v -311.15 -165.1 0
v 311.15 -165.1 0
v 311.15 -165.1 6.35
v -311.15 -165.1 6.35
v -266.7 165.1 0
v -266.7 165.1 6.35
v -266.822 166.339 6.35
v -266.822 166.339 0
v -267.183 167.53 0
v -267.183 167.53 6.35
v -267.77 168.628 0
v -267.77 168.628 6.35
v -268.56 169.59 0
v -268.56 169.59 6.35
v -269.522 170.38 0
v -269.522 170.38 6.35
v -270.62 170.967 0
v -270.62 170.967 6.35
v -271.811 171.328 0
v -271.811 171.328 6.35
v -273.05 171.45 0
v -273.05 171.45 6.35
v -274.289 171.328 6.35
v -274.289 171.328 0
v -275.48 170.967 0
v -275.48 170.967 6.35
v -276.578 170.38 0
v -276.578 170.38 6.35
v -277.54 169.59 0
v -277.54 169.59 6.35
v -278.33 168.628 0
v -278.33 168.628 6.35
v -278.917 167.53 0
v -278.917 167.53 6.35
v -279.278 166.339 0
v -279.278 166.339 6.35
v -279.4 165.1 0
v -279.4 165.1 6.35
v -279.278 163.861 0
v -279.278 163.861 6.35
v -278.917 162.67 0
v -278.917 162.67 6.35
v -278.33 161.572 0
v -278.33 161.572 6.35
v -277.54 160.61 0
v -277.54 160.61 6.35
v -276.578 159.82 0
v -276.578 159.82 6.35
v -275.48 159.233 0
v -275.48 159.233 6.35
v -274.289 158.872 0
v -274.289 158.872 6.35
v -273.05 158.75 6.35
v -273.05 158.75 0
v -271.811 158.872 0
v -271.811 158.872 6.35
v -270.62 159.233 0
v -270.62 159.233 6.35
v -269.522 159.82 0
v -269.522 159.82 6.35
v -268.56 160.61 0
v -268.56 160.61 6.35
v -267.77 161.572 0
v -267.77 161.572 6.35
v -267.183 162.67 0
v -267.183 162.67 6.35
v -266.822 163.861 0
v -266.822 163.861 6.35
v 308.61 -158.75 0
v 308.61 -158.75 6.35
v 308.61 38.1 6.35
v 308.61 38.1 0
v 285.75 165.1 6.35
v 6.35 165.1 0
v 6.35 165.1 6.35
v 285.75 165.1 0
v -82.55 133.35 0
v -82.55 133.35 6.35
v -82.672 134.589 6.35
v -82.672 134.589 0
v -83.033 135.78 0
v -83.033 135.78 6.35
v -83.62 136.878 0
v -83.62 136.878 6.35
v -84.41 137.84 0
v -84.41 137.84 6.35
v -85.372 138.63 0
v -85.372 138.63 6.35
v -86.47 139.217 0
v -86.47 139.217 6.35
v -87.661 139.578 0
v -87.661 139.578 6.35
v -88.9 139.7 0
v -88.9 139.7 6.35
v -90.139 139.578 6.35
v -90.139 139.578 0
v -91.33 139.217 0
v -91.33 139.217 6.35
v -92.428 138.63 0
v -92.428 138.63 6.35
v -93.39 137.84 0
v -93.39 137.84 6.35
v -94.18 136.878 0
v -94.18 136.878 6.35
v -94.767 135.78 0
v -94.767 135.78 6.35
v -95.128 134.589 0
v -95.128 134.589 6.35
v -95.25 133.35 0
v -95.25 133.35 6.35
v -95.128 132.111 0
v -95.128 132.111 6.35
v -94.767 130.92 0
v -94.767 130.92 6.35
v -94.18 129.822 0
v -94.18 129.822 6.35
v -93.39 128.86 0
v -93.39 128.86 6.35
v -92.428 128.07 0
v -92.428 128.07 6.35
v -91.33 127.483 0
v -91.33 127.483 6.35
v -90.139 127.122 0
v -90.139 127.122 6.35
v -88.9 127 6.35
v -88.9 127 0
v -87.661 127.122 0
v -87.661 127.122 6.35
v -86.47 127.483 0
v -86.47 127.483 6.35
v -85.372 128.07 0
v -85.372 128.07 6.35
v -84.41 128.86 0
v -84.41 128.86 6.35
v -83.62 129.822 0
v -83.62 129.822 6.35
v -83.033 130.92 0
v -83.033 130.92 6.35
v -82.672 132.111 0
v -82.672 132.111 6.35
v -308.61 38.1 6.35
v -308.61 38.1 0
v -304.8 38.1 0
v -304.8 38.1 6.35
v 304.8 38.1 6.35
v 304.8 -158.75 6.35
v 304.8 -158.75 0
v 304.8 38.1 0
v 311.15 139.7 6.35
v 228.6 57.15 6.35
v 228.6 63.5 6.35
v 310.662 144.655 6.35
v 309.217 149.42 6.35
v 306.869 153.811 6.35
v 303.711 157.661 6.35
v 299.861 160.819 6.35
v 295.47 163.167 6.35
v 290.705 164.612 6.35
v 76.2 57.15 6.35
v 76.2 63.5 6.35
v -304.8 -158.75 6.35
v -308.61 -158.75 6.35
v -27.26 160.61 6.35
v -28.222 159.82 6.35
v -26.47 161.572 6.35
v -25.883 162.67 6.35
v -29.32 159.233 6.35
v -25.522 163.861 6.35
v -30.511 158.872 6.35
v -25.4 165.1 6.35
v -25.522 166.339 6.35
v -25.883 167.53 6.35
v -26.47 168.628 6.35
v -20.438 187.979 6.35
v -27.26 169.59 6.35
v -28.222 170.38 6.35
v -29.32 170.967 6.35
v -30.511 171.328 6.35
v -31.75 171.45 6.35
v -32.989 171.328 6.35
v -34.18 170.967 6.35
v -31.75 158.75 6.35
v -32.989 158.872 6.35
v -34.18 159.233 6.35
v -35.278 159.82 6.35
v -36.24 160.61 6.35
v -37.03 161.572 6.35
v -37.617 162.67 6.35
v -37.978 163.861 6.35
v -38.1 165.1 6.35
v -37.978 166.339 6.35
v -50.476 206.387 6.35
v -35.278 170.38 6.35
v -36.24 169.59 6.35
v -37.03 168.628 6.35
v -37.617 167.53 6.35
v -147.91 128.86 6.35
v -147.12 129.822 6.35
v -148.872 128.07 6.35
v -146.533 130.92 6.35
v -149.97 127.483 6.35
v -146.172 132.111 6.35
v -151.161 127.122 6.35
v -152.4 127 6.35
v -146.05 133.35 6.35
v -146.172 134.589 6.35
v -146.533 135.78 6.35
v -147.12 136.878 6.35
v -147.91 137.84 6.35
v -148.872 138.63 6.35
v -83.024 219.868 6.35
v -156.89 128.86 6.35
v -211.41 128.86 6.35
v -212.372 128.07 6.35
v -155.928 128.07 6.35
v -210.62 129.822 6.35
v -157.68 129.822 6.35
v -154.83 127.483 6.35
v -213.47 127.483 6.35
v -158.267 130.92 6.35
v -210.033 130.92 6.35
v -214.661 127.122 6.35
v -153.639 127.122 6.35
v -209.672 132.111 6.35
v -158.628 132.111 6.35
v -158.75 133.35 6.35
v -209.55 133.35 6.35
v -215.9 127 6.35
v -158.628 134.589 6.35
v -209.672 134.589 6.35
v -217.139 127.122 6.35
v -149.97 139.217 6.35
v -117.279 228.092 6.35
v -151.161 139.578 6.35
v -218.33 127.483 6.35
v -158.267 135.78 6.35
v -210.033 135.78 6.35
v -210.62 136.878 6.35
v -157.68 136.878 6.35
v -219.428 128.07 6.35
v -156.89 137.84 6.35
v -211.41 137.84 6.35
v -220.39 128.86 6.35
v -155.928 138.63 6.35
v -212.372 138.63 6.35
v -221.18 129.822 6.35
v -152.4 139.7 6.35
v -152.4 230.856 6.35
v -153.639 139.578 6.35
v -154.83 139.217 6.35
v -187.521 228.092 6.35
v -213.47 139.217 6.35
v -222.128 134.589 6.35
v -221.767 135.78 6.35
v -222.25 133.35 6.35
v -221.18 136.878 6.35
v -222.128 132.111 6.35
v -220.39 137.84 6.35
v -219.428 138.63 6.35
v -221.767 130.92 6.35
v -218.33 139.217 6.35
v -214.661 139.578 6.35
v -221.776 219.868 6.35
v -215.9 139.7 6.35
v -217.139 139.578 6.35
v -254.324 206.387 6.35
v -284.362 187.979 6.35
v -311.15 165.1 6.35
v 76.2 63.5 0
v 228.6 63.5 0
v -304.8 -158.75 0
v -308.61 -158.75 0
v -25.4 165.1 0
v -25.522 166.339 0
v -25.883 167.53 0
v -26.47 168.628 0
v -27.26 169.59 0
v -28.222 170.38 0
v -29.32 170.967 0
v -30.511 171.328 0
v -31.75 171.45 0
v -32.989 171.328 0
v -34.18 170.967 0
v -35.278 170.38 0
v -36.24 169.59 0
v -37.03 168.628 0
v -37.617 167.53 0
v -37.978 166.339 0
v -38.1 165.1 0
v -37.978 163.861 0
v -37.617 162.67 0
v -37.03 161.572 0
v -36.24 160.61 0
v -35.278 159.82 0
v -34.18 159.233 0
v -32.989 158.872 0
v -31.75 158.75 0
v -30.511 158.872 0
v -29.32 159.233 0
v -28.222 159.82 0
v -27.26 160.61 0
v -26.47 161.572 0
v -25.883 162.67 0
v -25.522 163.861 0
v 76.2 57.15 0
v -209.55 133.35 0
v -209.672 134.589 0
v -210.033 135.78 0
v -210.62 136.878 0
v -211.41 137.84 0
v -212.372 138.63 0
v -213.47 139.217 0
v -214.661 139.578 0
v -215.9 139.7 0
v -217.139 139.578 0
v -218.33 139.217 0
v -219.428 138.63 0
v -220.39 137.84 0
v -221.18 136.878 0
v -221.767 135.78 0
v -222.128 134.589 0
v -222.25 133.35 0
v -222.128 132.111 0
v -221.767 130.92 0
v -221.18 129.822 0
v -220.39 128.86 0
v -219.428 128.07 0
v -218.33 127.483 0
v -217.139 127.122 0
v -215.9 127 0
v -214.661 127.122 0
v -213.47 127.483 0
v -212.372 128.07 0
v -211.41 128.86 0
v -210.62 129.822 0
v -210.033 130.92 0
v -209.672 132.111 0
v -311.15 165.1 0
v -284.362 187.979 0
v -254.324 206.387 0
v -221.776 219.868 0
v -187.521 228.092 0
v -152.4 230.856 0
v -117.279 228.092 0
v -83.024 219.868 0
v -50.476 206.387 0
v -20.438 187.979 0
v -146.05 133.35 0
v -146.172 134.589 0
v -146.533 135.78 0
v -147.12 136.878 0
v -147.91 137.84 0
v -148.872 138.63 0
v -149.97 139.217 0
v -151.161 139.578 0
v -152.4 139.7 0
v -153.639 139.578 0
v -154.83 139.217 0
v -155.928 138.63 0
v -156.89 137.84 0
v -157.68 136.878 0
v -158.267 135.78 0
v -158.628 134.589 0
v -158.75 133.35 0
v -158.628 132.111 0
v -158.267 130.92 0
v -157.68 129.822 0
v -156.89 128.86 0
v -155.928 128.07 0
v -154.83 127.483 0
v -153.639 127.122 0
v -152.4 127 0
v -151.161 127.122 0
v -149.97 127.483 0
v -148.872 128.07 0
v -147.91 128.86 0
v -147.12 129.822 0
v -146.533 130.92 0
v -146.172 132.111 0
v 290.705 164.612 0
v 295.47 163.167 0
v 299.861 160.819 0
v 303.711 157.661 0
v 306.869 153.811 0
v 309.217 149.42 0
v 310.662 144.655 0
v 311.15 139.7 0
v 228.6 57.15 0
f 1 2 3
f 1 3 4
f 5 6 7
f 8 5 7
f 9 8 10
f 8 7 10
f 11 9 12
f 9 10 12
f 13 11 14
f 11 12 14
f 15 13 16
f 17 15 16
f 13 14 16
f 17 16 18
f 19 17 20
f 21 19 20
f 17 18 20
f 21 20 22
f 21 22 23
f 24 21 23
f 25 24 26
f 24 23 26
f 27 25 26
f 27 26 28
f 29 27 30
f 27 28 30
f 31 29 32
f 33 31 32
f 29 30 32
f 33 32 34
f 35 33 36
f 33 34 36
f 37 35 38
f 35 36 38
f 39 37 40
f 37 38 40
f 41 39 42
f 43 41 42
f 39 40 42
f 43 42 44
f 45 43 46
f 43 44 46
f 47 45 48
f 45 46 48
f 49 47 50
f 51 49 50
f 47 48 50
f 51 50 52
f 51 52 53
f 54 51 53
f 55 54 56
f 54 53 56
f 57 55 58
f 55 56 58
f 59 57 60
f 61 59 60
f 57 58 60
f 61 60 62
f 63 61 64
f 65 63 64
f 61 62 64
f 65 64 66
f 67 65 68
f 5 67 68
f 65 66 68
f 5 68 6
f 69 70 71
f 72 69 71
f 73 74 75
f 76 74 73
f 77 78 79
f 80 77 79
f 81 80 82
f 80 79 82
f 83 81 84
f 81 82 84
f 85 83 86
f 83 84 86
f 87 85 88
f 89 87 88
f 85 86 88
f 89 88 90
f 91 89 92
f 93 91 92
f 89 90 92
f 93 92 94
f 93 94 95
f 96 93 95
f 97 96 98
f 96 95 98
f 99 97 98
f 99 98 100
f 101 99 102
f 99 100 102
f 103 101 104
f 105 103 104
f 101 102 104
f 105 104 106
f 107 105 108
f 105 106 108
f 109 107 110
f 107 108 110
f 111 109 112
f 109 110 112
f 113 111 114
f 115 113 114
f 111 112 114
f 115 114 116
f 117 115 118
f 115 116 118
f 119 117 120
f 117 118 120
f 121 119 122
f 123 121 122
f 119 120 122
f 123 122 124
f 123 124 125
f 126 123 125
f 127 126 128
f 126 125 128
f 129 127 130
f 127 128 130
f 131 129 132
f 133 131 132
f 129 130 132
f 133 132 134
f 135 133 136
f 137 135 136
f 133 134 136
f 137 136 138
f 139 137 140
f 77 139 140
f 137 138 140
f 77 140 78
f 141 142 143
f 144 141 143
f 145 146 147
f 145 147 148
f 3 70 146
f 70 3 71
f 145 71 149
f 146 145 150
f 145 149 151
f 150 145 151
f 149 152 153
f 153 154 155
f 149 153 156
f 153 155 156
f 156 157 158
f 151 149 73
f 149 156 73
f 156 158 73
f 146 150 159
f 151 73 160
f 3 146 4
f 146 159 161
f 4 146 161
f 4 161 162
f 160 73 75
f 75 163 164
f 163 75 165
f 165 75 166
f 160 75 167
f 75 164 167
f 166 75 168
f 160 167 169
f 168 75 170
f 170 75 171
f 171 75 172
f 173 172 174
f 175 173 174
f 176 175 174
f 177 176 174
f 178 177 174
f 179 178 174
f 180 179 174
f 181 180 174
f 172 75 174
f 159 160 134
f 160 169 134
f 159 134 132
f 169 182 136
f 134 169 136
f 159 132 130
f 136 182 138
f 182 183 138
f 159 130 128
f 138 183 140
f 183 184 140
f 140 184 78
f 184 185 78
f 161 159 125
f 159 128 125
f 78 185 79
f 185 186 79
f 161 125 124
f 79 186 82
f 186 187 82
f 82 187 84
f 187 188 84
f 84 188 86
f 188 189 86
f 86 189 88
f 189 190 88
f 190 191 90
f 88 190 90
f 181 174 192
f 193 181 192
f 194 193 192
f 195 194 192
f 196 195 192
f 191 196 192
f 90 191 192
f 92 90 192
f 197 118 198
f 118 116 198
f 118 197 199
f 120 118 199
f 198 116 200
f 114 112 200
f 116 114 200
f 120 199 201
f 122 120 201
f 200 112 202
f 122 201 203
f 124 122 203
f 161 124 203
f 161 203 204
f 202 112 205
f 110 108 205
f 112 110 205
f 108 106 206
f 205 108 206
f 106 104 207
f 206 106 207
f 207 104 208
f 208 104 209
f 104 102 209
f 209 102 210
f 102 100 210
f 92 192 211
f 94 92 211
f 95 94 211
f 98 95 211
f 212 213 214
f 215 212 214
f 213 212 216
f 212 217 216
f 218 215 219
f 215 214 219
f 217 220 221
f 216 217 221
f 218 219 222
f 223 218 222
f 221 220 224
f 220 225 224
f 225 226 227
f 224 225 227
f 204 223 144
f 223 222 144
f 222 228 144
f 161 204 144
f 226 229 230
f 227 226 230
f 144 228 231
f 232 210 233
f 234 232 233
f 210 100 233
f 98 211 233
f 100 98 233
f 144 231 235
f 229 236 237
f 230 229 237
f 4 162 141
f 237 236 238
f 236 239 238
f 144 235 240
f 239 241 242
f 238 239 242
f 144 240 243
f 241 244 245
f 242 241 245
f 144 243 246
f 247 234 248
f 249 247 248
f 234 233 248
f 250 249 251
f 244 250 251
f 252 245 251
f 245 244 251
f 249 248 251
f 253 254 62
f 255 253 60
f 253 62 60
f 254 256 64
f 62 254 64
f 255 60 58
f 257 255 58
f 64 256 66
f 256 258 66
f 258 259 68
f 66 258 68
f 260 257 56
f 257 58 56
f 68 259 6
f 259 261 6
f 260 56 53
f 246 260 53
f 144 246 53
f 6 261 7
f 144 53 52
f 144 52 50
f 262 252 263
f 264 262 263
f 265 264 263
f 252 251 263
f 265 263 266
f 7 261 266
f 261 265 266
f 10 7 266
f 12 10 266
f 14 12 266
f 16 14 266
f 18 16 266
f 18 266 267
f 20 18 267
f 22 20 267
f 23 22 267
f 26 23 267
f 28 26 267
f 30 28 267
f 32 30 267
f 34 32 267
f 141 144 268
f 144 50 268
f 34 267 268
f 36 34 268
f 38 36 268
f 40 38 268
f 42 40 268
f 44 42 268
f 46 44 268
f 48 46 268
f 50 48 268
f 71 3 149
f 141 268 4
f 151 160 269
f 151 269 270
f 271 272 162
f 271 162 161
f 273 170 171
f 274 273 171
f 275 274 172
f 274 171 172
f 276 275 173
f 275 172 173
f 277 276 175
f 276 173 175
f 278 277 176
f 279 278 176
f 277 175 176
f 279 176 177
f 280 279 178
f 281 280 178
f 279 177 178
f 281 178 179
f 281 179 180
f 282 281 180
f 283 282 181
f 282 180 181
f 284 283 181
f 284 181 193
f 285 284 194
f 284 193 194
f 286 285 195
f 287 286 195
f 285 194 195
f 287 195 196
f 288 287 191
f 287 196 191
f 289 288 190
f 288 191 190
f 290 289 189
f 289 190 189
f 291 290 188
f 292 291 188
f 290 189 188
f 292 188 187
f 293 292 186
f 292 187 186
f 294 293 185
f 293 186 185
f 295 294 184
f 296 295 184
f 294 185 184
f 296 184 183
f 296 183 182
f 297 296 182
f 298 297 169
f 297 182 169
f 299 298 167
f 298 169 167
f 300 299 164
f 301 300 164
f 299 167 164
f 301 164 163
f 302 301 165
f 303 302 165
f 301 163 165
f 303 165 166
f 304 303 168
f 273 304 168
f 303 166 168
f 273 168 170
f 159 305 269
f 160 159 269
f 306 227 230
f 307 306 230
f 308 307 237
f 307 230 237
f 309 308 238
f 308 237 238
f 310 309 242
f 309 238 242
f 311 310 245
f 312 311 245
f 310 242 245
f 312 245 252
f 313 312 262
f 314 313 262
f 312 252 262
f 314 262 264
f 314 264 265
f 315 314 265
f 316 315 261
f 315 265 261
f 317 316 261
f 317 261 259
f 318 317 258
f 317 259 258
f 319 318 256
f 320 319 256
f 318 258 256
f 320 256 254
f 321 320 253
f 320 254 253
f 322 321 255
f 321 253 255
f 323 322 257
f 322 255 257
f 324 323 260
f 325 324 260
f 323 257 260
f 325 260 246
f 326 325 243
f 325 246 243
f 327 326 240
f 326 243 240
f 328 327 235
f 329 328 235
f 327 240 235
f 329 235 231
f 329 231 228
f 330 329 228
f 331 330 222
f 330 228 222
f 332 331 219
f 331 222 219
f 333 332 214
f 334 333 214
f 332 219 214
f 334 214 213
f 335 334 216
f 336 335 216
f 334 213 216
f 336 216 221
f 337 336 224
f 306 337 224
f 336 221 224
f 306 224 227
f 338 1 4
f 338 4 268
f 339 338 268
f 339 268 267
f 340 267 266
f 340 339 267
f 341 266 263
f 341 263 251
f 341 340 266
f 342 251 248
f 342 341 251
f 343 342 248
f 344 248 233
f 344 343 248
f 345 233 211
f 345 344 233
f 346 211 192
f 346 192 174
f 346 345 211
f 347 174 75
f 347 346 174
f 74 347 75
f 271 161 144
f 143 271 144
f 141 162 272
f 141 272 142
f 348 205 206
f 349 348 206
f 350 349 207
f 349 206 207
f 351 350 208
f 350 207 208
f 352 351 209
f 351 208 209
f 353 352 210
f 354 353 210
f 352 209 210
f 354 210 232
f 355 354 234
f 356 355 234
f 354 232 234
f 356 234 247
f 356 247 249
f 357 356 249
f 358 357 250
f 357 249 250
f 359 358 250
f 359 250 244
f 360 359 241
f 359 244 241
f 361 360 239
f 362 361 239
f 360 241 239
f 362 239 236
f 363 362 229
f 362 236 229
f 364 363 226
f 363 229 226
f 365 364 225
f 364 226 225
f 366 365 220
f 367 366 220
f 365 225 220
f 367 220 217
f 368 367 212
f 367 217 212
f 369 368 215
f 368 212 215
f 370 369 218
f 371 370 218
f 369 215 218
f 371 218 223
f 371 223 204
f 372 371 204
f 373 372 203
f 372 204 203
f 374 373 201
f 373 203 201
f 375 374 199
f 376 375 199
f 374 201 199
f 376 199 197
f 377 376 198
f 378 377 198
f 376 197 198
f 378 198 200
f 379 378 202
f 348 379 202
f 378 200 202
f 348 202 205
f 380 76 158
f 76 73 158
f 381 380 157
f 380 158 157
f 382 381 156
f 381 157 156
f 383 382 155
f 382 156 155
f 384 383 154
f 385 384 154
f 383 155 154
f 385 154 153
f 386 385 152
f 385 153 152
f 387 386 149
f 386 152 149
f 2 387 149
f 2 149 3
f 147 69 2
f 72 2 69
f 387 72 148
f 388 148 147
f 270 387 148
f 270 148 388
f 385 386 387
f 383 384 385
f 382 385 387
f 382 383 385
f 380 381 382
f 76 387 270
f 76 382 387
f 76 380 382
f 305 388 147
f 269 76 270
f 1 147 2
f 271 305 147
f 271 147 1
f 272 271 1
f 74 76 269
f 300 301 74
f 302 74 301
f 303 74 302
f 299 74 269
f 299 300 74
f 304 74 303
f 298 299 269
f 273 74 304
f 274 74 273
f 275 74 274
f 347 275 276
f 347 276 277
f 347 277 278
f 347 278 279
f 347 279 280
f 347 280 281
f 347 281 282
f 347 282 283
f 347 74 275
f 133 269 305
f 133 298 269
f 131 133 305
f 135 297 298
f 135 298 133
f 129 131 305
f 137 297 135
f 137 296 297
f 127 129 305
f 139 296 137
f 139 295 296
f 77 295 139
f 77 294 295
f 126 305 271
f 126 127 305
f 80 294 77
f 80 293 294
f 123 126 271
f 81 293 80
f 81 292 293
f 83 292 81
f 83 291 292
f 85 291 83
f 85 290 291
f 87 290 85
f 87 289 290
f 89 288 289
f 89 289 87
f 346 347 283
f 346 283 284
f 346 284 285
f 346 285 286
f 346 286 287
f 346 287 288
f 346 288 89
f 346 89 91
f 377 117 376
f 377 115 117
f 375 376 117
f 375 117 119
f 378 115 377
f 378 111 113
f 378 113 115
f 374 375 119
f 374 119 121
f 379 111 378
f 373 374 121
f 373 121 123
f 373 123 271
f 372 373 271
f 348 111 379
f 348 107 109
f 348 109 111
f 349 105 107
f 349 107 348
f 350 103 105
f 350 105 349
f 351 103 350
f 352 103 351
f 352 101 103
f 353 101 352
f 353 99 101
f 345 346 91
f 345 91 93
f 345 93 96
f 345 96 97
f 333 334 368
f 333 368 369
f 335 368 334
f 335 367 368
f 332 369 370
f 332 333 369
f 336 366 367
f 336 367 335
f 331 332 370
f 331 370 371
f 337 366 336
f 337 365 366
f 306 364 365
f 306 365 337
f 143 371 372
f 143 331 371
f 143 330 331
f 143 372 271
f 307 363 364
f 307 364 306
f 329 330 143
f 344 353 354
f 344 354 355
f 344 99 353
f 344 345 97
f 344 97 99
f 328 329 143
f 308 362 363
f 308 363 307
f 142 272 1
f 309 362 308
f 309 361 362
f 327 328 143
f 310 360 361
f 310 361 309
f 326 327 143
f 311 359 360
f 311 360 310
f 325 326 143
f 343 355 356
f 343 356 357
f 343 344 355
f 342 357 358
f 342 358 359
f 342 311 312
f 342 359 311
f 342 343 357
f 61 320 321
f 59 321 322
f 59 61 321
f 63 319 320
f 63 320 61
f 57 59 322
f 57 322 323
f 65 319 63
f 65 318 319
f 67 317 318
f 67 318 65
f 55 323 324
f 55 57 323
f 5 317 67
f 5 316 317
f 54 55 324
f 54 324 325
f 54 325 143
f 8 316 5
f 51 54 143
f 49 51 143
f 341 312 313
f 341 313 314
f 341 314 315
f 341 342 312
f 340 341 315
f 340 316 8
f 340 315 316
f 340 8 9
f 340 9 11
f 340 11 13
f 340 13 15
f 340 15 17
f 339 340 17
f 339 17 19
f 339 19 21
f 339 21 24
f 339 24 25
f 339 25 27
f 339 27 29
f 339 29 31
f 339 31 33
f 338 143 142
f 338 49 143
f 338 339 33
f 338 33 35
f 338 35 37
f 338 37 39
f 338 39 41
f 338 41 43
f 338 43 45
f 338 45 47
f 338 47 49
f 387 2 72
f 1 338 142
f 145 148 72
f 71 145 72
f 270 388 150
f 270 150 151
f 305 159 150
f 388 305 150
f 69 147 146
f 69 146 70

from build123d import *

# Parameters (mm, degrees)
SALIENTE_EXTRUIR1_DEPTH = 6.35
CROQUIS2_W              = 152.4
CROQUIS2_H              = 6.35
CORTAR_EXTRUIR1_DEPTH   = 6.35
CROQUIS3_R              = 6.35
CORTAR_EXTRUIR2_DEPTH   = 6.35
CROQUIS4_R              = 6.35
CORTAR_EXTRUIR3_DEPTH   = 6.35
REDONDEO1_R             = 25.4
CROQUIS5_W              = 3.81
CROQUIS5_H              = 196.85
CORTAR_EXTRUIR4_DEPTH   = 6.35


with BuildPart() as part:
    # Croquis1 → Saliente-Extruir1 (new body)
    with BuildSketch(Plane.XY):
        with BuildLine():
            Line((6.35, 165.1), (311.15, 165.1))
            Line((311.15, 165.1), (311.15, -165.1))
            Line((311.15, -165.1), (-311.15, -165.1))
            Line((-311.15, -165.1), (-311.15, 165.1))
            ThreePointArc((-311.15, 165.1), (-152.4, 230.856403027), (6.35, 165.1))
        make_face()
    extrude(amount=SALIENTE_EXTRUIR1_DEPTH)

    # Croquis2 → Cortar-Extruir1 (cut)
    with BuildSketch(Plane.XY.offset(6.35)):
        with Locations((152.4, 60.325)):
            Rectangle(CROQUIS2_W, CROQUIS2_H)
    extrude(amount=-CORTAR_EXTRUIR1_DEPTH, mode=Mode.SUBTRACT)

    # Croquis3 → Cortar-Extruir2 (cut)
    with BuildSketch(Plane.XY.offset(6.35)):
        with Locations((-152.4, 133.35)):
            Circle(CROQUIS3_R)
        with Locations((-215.9, 133.35)):
            Circle(CROQUIS3_R)
        with Locations((-88.9, 133.35)):
            Circle(CROQUIS3_R)
    extrude(amount=-CORTAR_EXTRUIR2_DEPTH, mode=Mode.SUBTRACT)

    # Croquis4 → Cortar-Extruir3 (cut)
    with BuildSketch(Plane.XY.offset(6.35)):
        with Locations((-273.05, 165.1)):
            Circle(CROQUIS4_R)
        with Locations((-31.75, 165.1)):
            Circle(CROQUIS4_R)
    extrude(amount=-CORTAR_EXTRUIR3_DEPTH, mode=Mode.SUBTRACT)

    # Redondeo1
    redondeo1_edges = [part.edges().sort_by_distance(p)[0] for p in [
        (311.15, 165.1, 3.175),
    ]]
    fillet(redondeo1_edges, radius=REDONDEO1_R)

    # Croquis5 → Cortar-Extruir4 (cut)
    with BuildSketch(Plane.XY.offset(6.35)):
        with Locations((-306.705, -60.325)):
            Rectangle(CROQUIS5_W, CROQUIS5_H)
        with Locations((306.705, -60.325)):
            Rectangle(CROQUIS5_W, CROQUIS5_H)
    extrude(amount=-CORTAR_EXTRUIR4_DEPTH, mode=Mode.SUBTRACT)


solid = part.part
